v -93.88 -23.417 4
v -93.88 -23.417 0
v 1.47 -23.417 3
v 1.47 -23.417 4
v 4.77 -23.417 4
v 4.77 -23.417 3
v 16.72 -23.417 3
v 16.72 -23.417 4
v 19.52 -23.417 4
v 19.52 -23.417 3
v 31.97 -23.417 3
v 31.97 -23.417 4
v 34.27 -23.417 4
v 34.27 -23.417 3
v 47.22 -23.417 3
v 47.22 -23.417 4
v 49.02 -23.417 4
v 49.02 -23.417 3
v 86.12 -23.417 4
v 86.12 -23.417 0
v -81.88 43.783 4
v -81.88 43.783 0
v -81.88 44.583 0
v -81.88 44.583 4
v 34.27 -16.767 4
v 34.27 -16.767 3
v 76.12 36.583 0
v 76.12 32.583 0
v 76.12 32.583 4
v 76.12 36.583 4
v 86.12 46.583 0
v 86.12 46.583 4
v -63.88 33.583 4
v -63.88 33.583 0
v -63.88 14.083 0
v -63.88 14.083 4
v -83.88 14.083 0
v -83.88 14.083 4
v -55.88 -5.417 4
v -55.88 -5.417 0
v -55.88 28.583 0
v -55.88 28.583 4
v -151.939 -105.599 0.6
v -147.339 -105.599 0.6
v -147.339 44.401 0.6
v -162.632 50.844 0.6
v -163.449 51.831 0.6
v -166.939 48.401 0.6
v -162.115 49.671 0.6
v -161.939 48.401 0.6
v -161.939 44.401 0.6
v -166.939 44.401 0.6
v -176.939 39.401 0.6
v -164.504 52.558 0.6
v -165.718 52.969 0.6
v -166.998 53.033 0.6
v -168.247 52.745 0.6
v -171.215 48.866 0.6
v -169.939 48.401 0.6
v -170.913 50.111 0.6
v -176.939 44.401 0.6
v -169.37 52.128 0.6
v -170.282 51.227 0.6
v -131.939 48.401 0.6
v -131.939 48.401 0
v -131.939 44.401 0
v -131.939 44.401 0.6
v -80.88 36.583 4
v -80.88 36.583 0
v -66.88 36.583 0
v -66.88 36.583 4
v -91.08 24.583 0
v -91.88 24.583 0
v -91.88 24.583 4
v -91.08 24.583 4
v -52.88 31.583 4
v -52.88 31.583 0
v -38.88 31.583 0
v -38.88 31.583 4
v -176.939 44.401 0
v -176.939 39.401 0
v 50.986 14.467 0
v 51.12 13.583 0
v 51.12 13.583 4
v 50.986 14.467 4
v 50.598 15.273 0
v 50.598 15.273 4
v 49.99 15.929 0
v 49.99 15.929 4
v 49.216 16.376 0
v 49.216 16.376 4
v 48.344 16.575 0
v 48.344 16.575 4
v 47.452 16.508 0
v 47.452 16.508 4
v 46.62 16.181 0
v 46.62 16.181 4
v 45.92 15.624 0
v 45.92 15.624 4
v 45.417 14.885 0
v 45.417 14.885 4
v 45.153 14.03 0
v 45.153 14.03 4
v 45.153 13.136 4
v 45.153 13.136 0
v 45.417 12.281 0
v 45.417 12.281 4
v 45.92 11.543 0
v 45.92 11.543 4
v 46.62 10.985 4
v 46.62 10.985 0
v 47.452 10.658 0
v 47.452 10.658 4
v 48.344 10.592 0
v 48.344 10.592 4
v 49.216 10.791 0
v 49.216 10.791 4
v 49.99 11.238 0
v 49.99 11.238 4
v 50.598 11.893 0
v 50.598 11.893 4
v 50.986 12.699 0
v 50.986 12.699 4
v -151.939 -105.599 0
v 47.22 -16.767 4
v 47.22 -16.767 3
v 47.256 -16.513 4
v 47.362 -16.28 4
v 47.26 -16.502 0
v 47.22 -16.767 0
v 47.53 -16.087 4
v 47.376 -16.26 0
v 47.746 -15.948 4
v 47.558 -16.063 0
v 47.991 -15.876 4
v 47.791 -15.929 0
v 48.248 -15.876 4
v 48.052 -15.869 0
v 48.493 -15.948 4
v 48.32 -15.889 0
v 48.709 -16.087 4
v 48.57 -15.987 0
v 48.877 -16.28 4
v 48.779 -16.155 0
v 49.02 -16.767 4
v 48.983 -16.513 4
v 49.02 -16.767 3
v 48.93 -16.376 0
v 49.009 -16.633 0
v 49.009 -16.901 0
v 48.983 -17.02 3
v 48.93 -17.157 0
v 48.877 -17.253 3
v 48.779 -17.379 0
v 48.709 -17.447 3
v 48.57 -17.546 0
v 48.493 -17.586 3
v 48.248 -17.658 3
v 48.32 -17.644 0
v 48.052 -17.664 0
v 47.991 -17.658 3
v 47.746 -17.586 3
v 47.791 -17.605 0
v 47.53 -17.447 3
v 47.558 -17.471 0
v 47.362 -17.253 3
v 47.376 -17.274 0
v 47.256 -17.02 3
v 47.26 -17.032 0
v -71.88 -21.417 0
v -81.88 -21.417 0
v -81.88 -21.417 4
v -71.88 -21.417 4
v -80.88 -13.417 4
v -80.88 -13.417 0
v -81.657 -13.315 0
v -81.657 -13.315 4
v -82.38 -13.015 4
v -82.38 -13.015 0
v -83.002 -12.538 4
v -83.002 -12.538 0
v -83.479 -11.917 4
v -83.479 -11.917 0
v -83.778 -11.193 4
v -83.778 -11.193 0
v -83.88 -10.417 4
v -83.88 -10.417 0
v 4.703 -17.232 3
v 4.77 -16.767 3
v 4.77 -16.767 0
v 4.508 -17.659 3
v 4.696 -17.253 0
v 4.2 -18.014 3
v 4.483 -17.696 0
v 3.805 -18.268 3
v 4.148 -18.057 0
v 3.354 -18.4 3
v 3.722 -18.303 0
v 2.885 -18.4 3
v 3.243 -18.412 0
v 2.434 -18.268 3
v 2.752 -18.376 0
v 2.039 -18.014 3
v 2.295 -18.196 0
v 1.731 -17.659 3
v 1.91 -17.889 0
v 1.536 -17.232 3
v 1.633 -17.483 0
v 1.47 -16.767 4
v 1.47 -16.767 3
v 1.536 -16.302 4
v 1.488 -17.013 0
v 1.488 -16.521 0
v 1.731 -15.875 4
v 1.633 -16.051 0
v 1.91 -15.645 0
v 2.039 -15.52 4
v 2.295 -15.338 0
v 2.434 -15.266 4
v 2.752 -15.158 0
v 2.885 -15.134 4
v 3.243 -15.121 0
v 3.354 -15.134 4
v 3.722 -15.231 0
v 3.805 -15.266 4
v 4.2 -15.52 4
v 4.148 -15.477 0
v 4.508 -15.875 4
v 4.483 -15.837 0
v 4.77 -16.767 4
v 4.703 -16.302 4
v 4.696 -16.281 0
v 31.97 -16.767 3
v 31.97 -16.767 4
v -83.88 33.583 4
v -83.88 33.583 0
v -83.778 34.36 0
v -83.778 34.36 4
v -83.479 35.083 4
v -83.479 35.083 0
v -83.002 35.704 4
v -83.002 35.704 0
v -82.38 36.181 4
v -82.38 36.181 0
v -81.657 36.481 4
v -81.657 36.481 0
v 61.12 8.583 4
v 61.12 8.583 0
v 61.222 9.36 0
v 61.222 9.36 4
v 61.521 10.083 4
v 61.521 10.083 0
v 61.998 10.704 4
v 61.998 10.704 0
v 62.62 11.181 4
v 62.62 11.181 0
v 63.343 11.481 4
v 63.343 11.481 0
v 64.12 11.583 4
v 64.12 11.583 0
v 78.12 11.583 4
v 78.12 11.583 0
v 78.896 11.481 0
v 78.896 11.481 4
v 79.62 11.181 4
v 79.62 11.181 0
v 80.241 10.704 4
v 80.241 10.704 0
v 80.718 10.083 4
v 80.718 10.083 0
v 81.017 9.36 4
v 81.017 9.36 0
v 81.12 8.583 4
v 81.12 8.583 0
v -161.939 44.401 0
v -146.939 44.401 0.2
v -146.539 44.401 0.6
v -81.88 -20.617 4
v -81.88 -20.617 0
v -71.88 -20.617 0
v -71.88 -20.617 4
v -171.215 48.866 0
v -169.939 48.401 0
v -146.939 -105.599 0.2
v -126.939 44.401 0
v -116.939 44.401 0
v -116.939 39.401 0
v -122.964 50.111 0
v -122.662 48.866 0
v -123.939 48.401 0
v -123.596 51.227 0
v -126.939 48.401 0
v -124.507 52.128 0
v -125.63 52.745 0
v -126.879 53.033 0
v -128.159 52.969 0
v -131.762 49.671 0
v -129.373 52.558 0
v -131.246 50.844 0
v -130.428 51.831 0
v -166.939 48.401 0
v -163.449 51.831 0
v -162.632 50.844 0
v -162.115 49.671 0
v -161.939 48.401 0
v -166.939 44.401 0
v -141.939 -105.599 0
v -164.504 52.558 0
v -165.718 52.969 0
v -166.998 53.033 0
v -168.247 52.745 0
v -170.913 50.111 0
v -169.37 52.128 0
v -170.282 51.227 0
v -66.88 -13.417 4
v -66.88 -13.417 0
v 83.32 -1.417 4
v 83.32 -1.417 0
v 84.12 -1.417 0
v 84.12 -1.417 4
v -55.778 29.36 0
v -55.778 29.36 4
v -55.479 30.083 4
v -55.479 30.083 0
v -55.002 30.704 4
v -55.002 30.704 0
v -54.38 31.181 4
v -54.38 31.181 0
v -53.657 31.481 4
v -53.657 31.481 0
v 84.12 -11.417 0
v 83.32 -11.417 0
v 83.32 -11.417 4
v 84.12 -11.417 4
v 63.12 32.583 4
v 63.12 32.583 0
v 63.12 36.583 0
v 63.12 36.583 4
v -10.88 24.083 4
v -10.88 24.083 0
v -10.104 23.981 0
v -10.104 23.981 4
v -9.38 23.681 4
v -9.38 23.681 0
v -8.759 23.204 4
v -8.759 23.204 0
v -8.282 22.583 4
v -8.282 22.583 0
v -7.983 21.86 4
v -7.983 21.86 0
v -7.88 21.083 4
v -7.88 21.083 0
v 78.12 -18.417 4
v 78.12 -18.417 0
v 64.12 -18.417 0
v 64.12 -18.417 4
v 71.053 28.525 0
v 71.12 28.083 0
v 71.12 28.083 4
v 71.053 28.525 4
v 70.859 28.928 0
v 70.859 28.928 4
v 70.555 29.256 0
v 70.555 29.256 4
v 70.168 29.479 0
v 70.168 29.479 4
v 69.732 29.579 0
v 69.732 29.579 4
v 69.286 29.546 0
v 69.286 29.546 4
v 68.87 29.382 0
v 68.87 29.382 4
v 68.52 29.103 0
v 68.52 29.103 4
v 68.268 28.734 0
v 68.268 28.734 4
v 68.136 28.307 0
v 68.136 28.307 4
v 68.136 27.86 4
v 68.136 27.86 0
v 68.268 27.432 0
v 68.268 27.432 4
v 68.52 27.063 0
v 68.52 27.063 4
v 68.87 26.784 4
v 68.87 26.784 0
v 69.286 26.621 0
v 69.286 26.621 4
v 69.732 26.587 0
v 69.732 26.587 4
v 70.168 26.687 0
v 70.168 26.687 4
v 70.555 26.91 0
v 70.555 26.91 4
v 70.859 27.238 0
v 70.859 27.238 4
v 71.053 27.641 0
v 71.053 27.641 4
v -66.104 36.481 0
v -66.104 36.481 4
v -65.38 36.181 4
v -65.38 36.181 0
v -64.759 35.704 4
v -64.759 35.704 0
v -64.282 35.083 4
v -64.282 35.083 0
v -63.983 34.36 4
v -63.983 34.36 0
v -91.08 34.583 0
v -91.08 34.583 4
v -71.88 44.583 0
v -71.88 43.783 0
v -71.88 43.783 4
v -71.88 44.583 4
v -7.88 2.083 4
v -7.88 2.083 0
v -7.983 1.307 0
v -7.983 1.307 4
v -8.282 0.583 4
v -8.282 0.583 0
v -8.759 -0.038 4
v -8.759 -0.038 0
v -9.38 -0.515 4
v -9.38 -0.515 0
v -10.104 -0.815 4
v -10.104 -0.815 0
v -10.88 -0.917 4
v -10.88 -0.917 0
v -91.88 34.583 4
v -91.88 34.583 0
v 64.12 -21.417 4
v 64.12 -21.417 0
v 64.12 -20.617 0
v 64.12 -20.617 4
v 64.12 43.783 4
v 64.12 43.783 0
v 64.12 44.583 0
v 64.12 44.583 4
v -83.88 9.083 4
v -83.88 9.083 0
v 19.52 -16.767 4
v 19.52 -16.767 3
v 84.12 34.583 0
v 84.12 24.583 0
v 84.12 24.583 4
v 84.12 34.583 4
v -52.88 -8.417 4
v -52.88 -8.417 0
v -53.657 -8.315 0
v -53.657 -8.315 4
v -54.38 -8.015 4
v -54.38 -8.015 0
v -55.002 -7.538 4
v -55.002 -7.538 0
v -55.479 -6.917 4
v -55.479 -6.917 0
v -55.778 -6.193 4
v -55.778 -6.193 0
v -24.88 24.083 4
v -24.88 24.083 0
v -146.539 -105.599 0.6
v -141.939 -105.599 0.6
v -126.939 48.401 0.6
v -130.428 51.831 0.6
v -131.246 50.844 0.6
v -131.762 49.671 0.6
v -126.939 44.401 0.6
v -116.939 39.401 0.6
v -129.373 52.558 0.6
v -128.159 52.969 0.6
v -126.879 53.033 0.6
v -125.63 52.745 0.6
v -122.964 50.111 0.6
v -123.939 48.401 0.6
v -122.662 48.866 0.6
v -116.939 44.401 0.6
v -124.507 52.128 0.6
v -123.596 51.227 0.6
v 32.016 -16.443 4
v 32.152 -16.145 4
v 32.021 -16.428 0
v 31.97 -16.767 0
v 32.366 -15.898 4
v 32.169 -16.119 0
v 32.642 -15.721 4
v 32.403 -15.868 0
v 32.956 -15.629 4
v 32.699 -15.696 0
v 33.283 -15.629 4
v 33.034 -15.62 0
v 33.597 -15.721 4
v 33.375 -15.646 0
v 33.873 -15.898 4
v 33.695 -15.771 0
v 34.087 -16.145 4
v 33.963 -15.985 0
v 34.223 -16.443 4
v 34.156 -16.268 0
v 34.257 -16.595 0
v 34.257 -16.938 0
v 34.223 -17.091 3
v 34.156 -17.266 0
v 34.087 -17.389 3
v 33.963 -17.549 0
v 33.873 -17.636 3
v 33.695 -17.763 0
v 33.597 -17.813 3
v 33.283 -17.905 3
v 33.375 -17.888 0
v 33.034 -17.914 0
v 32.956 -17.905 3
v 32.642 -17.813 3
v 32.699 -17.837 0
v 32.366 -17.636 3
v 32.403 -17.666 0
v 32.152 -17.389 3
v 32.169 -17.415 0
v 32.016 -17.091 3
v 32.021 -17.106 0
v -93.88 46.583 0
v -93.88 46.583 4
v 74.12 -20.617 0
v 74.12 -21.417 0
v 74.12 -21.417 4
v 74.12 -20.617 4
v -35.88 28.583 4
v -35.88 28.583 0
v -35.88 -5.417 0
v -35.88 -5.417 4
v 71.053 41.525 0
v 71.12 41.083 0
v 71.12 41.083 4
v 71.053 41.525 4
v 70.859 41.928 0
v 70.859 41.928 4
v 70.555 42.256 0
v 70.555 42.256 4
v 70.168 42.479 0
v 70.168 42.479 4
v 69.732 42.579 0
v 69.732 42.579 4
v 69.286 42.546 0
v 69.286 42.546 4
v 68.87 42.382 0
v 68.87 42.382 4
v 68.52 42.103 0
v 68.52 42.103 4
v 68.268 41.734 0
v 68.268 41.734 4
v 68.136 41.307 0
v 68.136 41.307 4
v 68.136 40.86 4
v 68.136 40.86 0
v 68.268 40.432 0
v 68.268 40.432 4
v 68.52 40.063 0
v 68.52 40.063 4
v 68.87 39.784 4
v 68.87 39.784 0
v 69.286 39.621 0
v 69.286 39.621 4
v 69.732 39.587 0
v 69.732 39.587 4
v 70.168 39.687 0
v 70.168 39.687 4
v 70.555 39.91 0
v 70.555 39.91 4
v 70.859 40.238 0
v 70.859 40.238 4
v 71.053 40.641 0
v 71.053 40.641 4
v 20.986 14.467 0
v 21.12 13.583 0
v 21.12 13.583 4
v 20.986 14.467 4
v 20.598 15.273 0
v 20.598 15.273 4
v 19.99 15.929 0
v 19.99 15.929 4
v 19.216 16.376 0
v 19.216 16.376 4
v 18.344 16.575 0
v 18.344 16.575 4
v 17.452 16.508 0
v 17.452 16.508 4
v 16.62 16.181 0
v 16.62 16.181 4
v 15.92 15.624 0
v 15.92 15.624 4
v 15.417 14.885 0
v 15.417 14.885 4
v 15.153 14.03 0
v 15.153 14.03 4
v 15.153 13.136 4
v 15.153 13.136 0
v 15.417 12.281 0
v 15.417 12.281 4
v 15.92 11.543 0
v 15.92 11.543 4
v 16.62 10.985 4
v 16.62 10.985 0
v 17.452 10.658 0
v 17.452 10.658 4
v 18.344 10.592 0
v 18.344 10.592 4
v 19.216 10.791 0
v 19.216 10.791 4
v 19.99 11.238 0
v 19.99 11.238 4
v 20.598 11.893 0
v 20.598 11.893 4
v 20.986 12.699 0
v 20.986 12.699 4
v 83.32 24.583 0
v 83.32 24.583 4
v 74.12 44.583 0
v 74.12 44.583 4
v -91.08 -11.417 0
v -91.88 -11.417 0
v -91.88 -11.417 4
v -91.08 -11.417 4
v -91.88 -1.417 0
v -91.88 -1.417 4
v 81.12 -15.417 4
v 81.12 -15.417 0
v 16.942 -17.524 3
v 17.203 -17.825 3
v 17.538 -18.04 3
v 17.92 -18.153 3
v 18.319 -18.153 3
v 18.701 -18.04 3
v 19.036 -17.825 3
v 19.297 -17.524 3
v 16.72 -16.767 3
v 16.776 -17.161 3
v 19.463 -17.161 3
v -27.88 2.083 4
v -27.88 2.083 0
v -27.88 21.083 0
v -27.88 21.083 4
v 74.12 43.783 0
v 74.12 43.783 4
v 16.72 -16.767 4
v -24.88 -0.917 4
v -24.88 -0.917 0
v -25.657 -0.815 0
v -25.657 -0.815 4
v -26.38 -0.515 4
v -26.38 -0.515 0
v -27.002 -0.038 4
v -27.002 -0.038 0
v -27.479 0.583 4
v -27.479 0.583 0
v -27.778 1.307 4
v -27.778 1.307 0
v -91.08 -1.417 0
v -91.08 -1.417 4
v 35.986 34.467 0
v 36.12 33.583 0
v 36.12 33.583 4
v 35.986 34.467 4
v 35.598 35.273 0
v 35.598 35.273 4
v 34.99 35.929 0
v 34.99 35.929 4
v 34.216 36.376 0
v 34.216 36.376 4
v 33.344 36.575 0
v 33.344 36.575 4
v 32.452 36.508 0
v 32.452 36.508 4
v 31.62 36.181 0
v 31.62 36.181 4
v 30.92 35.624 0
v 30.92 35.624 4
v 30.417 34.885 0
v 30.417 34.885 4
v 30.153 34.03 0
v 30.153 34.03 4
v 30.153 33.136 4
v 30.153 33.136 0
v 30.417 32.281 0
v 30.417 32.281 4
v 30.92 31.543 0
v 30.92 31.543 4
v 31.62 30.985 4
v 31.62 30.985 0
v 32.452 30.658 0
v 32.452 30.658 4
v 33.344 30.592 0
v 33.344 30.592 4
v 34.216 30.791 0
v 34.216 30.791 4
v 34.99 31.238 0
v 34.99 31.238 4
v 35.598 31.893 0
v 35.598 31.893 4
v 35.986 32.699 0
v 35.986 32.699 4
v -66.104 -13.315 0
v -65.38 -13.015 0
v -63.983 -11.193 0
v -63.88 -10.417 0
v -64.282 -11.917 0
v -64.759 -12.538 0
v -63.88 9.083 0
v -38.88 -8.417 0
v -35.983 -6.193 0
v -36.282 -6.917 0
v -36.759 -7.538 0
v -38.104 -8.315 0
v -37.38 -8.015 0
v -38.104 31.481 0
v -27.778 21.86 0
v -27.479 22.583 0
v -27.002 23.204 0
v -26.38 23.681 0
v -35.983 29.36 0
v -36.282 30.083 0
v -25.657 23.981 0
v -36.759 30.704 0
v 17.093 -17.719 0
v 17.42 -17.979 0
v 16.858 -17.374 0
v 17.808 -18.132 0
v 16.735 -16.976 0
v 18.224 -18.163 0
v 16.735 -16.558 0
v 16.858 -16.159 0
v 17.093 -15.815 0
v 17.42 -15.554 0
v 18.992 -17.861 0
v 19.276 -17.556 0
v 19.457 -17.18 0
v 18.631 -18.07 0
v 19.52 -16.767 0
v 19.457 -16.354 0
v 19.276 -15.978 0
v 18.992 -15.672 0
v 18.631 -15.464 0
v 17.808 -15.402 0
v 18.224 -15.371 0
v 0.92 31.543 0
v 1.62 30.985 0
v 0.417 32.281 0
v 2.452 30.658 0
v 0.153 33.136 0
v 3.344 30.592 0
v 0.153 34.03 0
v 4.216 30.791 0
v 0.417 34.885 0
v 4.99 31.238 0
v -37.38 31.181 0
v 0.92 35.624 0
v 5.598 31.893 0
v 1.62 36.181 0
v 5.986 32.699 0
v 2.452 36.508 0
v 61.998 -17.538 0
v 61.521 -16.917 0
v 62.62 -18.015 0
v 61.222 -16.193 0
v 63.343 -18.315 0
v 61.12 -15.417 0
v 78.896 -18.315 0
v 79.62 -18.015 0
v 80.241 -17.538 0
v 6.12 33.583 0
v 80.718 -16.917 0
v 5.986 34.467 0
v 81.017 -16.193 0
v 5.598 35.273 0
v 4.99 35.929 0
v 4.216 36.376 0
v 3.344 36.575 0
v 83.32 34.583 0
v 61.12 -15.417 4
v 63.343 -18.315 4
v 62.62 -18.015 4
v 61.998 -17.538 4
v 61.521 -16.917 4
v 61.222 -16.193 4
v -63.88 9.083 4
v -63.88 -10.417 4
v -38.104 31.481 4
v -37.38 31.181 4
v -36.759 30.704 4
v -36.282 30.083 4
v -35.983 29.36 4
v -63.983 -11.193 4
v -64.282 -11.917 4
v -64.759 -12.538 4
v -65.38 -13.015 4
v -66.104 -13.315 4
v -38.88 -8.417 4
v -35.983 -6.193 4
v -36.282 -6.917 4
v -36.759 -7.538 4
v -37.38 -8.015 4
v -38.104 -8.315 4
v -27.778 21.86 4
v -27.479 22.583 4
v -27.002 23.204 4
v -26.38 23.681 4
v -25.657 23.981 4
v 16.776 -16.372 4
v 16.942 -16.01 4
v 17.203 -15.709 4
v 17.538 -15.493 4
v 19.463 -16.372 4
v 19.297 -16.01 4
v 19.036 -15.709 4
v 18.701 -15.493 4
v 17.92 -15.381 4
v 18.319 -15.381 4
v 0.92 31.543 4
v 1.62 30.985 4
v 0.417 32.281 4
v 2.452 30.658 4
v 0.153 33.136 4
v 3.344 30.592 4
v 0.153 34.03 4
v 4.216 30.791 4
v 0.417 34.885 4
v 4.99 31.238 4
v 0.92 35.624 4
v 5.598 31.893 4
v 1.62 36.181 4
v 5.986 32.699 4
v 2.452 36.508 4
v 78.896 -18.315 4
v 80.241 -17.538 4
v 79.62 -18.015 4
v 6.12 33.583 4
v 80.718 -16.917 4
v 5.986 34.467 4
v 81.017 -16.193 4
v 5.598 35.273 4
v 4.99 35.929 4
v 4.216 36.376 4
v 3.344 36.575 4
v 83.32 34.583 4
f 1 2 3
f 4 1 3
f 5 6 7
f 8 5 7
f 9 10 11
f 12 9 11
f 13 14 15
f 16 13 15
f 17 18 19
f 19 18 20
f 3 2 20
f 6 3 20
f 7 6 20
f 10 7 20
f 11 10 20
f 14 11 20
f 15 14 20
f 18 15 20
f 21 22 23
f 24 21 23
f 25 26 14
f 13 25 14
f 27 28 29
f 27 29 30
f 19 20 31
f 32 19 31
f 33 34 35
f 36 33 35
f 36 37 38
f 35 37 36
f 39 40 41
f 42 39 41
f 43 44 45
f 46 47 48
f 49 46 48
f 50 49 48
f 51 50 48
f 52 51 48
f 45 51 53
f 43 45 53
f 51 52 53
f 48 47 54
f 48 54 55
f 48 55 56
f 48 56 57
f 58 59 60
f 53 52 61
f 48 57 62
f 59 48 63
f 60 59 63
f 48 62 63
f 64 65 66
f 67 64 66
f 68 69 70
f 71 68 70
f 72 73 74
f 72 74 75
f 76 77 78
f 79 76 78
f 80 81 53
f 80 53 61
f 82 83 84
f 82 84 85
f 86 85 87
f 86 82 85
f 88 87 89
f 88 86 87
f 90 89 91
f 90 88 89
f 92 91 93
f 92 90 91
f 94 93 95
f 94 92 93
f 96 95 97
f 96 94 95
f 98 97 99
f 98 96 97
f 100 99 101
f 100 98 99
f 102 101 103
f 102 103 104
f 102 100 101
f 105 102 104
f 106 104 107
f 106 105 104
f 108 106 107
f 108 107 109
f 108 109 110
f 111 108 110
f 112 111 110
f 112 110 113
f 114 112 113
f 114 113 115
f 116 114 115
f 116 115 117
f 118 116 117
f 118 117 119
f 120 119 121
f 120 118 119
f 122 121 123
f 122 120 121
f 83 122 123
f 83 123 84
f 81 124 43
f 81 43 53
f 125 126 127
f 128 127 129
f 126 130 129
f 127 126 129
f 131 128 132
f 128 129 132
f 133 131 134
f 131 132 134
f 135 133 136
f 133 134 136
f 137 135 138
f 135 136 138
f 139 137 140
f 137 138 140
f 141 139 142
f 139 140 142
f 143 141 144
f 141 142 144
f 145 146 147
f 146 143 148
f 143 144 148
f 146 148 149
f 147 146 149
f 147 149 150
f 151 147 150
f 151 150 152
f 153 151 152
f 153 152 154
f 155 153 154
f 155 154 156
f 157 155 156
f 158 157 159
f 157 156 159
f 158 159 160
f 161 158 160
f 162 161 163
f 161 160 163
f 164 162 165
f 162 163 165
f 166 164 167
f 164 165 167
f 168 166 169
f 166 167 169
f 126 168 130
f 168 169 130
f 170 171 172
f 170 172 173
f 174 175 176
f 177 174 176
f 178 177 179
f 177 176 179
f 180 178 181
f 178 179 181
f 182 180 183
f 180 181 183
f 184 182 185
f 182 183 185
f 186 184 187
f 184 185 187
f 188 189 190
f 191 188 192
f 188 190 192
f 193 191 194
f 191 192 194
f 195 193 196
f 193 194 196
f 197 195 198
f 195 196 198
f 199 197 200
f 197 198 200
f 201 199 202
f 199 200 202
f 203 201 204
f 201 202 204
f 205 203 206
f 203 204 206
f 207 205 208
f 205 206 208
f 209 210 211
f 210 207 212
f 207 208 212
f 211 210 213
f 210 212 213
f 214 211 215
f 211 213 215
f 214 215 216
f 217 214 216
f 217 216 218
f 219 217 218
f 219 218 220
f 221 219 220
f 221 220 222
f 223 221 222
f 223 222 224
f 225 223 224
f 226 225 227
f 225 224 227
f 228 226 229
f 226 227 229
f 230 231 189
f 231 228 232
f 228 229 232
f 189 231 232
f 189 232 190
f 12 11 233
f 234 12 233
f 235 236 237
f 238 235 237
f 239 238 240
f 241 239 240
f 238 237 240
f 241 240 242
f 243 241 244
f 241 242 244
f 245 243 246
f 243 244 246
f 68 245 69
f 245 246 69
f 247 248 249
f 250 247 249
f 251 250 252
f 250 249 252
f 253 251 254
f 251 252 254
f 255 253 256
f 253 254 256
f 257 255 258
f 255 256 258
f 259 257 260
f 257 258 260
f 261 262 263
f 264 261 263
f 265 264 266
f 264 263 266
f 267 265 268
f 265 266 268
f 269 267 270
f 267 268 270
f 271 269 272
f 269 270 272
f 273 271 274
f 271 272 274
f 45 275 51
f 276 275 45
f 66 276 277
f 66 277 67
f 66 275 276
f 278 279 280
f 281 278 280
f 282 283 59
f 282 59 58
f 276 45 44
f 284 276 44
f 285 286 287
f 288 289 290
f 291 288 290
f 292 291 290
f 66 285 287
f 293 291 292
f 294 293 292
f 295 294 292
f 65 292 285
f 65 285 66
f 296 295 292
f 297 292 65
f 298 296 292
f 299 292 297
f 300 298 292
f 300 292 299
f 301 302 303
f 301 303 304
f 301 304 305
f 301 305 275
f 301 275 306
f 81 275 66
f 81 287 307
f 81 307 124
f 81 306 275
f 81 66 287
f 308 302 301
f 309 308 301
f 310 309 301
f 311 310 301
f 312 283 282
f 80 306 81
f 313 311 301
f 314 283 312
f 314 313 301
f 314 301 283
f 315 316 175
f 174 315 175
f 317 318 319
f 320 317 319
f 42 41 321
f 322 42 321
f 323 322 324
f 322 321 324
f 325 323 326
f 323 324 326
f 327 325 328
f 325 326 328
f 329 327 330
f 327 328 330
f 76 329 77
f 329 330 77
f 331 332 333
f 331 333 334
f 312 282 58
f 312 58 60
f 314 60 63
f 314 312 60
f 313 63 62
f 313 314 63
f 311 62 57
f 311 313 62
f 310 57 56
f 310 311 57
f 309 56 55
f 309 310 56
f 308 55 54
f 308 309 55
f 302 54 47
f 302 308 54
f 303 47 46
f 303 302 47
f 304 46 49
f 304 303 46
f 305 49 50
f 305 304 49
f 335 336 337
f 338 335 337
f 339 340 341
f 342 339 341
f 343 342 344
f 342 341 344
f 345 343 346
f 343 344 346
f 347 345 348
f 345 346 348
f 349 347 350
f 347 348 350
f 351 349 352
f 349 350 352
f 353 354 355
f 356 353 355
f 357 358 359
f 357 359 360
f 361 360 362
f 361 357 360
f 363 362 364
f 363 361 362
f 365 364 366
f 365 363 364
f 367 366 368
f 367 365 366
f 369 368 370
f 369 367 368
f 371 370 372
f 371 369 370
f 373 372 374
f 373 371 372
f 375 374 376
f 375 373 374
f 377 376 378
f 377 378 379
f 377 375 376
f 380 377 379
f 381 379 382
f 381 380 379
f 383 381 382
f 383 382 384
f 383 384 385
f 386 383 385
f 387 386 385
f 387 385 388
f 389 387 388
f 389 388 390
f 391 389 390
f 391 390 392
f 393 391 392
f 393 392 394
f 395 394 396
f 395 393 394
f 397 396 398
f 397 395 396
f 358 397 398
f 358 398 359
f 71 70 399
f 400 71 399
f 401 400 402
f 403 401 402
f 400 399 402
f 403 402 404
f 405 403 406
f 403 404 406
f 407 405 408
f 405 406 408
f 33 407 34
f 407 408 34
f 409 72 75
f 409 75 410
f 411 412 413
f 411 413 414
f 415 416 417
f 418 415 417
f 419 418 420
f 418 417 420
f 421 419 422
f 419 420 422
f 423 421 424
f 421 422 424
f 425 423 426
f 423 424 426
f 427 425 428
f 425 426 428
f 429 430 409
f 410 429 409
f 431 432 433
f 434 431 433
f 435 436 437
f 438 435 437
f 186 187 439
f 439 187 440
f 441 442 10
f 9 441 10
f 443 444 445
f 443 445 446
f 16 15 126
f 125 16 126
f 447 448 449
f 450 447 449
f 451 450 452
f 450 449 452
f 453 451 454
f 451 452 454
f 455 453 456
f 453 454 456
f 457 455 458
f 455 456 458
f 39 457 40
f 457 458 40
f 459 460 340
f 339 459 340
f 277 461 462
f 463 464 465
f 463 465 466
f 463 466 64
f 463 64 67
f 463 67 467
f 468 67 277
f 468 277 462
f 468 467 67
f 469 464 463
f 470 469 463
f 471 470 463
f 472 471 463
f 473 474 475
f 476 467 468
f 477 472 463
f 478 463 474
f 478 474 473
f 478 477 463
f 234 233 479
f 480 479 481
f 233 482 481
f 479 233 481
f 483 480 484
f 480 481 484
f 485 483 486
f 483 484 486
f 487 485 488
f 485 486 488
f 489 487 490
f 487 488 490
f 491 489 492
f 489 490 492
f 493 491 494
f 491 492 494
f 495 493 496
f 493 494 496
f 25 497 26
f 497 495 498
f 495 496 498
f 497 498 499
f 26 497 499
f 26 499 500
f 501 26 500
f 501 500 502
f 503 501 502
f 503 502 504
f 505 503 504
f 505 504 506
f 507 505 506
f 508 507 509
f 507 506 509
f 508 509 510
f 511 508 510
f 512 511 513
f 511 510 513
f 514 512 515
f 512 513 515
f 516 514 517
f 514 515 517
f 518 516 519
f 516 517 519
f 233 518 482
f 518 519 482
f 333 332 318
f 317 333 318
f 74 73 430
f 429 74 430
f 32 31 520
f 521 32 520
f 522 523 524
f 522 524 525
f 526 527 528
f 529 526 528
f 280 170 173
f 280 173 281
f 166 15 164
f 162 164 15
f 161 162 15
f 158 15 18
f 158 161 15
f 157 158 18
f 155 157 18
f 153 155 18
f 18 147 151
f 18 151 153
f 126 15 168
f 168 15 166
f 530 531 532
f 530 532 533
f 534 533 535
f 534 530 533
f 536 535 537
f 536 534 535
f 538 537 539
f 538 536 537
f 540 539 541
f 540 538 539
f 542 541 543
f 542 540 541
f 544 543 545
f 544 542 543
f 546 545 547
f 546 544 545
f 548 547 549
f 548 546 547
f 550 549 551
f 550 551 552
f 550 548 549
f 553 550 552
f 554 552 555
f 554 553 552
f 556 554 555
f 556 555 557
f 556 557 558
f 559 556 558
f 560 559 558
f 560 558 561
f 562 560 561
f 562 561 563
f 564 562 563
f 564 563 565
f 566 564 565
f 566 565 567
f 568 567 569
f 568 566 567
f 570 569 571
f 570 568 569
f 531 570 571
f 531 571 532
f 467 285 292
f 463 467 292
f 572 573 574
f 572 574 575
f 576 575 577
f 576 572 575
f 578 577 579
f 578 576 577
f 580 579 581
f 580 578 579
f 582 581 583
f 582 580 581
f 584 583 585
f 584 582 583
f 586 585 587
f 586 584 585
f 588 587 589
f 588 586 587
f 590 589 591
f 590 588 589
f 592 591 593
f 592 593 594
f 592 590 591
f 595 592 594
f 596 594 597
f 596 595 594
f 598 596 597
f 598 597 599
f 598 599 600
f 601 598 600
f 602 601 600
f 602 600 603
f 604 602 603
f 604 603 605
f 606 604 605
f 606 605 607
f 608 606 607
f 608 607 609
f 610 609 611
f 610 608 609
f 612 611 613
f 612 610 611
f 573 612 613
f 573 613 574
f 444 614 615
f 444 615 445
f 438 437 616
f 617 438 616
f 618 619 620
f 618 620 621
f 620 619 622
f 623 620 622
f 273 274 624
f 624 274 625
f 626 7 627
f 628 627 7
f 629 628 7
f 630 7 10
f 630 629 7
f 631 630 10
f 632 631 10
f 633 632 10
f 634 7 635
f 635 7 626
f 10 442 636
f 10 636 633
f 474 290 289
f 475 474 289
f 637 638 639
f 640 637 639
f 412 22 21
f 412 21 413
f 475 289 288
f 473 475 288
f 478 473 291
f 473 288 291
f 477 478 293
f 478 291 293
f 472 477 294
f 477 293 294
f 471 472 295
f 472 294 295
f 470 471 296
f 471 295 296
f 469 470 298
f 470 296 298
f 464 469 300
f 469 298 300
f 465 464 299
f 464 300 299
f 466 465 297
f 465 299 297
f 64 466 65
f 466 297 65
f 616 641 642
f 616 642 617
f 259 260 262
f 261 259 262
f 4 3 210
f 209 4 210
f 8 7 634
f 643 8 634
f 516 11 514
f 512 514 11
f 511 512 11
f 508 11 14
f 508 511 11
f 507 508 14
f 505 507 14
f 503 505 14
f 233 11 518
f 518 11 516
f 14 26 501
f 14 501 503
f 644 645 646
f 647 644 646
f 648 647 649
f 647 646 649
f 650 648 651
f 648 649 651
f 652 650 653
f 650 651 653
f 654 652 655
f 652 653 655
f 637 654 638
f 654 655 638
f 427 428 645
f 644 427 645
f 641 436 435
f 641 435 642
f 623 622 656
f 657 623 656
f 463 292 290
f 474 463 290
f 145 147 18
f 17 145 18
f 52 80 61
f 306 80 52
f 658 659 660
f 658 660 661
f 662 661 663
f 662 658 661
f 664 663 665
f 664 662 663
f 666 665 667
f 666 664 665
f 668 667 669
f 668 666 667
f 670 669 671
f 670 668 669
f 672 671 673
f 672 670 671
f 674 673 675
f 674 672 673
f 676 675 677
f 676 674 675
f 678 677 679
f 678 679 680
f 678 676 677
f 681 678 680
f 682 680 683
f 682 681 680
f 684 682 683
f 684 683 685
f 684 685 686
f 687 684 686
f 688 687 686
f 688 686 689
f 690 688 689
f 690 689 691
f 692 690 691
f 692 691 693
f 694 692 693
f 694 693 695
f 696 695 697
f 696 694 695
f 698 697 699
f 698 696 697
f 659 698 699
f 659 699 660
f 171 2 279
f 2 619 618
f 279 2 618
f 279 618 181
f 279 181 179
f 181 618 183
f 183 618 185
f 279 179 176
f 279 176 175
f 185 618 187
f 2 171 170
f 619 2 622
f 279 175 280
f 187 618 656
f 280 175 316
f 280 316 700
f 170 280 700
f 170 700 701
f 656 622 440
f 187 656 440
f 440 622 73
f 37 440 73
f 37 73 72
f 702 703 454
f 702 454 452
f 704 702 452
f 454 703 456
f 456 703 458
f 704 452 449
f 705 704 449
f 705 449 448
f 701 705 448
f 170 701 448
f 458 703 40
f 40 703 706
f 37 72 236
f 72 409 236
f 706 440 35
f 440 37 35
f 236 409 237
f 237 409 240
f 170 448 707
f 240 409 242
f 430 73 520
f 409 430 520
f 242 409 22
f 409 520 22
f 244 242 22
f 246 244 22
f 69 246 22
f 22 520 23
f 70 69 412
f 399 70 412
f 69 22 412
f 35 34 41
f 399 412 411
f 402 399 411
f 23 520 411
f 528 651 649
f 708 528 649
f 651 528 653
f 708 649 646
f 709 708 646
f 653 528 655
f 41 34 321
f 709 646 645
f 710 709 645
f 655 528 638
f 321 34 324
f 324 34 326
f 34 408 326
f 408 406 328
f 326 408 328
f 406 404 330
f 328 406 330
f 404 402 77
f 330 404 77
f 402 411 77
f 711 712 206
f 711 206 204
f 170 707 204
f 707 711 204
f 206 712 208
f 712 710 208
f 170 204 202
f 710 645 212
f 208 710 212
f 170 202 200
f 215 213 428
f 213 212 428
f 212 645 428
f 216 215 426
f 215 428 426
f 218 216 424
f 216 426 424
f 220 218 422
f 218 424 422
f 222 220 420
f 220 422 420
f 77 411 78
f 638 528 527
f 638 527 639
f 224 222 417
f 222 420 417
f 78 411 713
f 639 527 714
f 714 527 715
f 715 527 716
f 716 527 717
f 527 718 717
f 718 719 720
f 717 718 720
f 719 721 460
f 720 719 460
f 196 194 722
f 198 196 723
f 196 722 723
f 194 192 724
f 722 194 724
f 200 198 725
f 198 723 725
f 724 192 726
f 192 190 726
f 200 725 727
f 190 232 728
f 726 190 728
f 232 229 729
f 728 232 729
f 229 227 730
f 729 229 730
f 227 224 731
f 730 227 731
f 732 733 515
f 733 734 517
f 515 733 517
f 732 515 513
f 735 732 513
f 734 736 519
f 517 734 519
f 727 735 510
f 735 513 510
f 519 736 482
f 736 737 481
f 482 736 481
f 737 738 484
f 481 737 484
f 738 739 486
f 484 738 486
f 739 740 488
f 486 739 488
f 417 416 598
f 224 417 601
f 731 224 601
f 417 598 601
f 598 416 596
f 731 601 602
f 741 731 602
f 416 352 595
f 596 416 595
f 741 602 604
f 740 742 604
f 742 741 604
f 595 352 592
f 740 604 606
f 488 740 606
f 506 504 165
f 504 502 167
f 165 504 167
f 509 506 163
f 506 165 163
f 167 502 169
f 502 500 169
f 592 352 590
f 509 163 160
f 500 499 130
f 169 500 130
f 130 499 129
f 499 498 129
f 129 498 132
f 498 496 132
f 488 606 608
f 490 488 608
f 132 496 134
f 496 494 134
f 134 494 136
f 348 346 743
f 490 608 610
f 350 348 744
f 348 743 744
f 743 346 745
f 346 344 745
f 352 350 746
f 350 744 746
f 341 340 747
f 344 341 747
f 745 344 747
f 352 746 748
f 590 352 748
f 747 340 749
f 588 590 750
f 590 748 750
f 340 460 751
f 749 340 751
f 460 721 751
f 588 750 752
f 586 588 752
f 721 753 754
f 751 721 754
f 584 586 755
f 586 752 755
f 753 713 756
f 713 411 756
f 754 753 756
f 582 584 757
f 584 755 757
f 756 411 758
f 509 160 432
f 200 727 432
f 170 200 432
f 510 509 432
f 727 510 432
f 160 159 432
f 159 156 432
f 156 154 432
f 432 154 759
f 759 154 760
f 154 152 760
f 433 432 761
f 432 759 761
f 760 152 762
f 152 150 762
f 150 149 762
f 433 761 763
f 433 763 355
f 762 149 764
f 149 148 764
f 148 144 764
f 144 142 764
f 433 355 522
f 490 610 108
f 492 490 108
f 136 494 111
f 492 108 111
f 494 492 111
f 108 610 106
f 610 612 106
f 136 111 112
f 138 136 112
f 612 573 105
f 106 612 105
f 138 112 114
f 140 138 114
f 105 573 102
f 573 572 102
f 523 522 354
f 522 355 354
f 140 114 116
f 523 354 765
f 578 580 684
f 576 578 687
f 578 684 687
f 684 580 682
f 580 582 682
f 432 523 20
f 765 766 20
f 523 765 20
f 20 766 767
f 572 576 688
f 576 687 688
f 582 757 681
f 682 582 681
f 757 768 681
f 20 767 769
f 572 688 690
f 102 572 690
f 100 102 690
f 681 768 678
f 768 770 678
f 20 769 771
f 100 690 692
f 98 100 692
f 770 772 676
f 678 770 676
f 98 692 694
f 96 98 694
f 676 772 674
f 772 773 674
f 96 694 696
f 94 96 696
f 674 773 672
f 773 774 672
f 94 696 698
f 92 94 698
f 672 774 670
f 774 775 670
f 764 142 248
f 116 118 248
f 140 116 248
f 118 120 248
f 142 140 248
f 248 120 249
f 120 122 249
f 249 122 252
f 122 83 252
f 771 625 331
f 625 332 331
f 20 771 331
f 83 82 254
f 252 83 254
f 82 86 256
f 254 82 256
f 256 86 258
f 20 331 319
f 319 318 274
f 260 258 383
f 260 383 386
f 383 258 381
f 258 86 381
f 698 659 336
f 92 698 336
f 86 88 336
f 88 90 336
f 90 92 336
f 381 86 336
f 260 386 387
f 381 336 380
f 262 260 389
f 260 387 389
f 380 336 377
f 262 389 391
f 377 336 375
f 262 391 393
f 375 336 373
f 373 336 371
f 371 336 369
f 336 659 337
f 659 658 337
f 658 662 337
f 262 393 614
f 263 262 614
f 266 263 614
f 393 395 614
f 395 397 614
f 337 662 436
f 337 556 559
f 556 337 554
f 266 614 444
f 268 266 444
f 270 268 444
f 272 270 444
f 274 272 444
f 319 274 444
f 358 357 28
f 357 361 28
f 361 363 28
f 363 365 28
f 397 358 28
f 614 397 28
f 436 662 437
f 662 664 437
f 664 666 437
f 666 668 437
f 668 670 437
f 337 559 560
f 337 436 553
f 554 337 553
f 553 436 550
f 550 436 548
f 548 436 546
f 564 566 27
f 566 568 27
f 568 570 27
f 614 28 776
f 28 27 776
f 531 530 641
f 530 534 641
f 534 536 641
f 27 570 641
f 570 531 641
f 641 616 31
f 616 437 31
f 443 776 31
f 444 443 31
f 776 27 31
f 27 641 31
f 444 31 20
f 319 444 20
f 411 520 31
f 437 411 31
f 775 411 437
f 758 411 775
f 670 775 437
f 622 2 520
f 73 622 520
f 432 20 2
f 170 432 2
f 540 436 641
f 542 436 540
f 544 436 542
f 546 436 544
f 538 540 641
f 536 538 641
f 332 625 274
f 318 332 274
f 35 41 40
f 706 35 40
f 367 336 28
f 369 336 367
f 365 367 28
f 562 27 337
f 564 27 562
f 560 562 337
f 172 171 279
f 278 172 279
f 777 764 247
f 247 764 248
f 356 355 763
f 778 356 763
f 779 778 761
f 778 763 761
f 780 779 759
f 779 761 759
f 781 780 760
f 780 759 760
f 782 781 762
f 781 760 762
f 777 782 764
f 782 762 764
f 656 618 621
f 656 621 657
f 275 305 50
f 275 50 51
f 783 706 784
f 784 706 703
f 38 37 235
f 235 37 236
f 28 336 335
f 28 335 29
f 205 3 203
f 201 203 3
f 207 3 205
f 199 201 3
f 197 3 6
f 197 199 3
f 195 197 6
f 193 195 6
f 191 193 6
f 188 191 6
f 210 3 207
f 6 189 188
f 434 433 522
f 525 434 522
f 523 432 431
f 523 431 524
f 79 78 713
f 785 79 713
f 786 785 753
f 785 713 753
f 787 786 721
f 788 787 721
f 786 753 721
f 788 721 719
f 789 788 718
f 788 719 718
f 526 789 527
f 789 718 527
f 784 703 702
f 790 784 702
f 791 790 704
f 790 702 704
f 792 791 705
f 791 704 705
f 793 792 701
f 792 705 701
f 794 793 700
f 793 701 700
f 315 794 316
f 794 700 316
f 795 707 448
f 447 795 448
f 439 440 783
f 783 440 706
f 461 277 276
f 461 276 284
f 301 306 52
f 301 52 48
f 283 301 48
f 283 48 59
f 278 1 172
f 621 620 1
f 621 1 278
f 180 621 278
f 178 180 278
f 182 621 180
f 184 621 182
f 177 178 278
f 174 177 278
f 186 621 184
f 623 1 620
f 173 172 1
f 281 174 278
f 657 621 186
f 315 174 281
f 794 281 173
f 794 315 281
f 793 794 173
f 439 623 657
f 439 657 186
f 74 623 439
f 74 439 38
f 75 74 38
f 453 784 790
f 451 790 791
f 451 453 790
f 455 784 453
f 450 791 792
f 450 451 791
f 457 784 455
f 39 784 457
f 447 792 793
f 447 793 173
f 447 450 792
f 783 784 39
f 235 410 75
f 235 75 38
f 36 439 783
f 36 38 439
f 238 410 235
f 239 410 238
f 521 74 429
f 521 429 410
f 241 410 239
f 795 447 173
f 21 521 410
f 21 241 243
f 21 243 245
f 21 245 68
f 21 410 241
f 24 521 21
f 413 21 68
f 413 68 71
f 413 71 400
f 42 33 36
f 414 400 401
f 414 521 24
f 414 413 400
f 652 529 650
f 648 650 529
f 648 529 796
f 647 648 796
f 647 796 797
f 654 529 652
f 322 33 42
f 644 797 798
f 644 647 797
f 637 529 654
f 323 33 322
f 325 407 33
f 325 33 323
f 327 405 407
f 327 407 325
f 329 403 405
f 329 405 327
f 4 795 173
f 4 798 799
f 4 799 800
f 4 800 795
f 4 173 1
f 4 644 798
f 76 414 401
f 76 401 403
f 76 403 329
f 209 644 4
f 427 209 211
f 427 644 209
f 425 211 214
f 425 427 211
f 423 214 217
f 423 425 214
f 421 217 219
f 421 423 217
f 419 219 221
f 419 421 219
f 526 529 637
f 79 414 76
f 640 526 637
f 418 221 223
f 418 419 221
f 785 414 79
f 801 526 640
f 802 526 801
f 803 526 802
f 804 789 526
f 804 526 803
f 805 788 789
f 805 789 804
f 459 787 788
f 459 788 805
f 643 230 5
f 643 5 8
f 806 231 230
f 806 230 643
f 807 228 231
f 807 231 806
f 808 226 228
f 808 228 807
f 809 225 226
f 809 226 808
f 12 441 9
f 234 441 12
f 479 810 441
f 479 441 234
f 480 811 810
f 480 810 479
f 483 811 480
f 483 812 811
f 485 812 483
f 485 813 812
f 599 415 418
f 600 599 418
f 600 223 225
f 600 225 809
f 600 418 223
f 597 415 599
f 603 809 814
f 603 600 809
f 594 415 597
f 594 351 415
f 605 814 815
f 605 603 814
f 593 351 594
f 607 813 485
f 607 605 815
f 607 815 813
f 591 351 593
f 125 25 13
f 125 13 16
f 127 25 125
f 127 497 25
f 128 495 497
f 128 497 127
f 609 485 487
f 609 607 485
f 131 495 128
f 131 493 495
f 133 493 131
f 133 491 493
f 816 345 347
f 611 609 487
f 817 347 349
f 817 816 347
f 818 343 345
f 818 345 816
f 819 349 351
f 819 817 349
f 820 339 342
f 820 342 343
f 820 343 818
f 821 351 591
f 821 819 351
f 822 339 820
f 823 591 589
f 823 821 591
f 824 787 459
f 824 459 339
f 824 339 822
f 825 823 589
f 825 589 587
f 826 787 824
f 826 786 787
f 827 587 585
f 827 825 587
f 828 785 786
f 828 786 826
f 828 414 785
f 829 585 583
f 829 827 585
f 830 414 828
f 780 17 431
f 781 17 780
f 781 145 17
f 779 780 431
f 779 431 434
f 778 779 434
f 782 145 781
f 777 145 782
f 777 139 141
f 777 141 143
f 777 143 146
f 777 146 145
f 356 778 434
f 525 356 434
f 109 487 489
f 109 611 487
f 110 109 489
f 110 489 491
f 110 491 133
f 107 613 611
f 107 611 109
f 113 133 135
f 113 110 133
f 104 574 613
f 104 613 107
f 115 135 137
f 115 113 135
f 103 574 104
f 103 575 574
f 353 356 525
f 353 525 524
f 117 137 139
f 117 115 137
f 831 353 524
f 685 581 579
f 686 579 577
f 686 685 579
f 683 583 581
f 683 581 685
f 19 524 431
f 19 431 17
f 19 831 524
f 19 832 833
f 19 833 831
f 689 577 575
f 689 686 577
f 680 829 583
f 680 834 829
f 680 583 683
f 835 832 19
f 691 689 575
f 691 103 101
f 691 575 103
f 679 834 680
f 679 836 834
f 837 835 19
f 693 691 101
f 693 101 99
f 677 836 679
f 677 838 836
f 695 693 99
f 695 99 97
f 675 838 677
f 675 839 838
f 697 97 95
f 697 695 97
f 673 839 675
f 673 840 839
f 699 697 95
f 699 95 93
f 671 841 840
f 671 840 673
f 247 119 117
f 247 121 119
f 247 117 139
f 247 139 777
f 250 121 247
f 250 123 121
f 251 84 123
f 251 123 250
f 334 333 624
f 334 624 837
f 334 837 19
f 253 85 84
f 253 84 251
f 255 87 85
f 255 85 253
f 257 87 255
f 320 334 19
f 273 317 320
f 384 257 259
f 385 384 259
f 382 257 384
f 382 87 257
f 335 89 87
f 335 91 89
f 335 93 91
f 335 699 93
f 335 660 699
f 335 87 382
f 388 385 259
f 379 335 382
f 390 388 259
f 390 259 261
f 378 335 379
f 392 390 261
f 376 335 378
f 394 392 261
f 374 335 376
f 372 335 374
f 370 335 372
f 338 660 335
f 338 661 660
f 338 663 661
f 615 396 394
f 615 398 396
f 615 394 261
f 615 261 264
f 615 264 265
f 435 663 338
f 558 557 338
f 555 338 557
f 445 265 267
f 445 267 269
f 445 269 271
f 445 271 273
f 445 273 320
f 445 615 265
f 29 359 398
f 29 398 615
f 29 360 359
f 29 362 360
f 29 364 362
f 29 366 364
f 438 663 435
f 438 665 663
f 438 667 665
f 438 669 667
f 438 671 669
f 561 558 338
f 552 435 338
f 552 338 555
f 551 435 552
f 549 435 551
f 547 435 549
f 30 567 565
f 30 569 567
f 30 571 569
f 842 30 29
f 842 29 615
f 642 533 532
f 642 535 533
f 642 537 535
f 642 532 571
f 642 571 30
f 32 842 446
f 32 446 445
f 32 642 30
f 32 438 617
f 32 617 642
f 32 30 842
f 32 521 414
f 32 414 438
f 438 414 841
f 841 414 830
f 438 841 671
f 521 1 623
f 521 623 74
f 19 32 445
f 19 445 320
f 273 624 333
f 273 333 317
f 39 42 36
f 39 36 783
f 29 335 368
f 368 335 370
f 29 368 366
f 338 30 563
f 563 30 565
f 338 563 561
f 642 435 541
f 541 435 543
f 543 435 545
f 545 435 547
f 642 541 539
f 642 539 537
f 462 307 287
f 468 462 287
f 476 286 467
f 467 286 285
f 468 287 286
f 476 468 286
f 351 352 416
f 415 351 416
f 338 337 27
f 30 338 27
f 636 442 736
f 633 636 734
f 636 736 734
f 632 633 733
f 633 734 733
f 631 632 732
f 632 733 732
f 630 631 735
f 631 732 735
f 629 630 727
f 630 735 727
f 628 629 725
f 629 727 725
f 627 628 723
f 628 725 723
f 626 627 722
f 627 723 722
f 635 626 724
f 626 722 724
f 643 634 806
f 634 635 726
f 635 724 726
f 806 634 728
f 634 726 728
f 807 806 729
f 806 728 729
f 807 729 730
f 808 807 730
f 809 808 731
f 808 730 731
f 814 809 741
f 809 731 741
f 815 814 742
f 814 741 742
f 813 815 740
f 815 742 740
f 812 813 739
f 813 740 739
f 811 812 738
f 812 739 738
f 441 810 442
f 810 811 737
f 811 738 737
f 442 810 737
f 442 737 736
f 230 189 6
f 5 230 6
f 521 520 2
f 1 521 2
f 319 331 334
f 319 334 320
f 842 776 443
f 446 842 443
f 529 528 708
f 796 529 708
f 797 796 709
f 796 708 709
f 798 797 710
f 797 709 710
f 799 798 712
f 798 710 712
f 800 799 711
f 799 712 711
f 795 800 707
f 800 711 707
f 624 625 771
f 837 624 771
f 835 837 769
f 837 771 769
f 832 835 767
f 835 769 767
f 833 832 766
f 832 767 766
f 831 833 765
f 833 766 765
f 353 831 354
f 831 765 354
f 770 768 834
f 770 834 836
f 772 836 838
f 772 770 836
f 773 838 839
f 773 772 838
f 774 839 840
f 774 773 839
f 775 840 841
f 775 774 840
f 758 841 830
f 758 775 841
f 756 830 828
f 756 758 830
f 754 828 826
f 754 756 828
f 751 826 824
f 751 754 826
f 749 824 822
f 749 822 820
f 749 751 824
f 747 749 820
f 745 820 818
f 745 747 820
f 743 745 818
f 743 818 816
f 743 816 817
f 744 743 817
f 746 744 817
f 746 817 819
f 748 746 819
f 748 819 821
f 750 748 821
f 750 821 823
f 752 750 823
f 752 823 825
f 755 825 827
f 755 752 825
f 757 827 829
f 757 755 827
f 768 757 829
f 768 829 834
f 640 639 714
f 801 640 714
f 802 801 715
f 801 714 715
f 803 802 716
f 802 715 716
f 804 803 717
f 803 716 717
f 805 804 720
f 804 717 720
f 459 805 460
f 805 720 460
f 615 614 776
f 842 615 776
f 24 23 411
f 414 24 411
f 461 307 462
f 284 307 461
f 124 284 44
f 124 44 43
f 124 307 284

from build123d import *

# Parameters (mm, degrees)
F0_W     = 0.8
F0_H     = 10
F0_W_2   = 10
F0_H_2   = 0.8
F0_R     = 3
F0_R_2   = 1.5
F0_W_3   = 13
F0_H_3   = 4
F0_W_4   = 20
F0_H_4   = 5
F1_DEPTH = 4
F2_DEPTH = 0.6
F3_DEPTH = 0.6
F4_SIZE  = 0.4
F6_DEPTH = 3


with BuildPart() as f1:
    # F0 (on Top) → F1 (new body)
    with BuildSketch(Plane.XY):
        with BuildLine():
            Line((86.1195294857, 46.5831286013), (-93.8804705143, 46.5831286013))
            Line((-93.8804705143, 46.5831286013), (-93.8804705143, -23.4168713987))
            Line((-93.8804705143, -23.4168713987), (1.4695294857, -23.4168713987))
            Line((1.4695294857, -23.4168713987), (1.4695294857, -16.7668713987))
            ThreePointArc((1.4695294857, -16.7668713987), (3.1195294857, -15.1168713987), (4.7695294857, -16.7668713987))
            Line((4.7695294857, -16.7668713987), (4.7695294857, -23.4168713987))
            Line((4.7695294857, -23.4168713987), (16.7195294857, -23.4168713987))
            Line((16.7195294857, -23.4168713987), (16.7195294857, -16.7668713987))
            ThreePointArc((16.7195294857, -16.7668713987), (18.1195294857, -15.3668713987), (19.5195294857, -16.7668713987))
            Line((19.5195294857, -16.7668713987), (19.5195294857, -23.4168713987))
            Line((19.5195294857, -23.4168713987), (31.9695294857, -23.4168713987))
            Line((31.9695294857, -23.4168713987), (31.9695294857, -16.7668713987))
            ThreePointArc((31.9695294857, -16.7668713987), (33.1195294857, -15.6168713987), (34.2695294857, -16.7668713987))
            Line((34.2695294857, -16.7668713987), (34.2695294857, -23.4168713987))
            Line((34.2695294857, -23.4168713987), (47.2195294857, -23.4168713987))
            Line((47.2195294857, -23.4168713987), (47.2195294857, -16.7668713987))
            ThreePointArc((47.2195294857, -16.7668713987), (48.1195294857, -15.8668713987), (49.0195294857, -16.7668713987))
            Line((49.0195294857, -16.7668713987), (49.0195294857, -23.4168713987))
            Line((49.0195294857, -23.4168713987), (86.1195294857, -23.4168713987))
            Line((86.1195294857, -23.4168713987), (86.1195294857, -13.4168713987))
            Line((86.1195294857, -13.4168713987), (86.1195294857, -7.4168713987))
            Line((86.1195294857, -7.4168713987), (86.1195294857, 30.5831286013))
            Line((86.1195294857, 30.5831286013), (86.1195294857, 36.5831286013))
            Line((86.1195294857, 36.5831286013), (86.1195294857, 46.5831286013))
        make_face()
        with Locations((-91.4804705143, -6.4168713987)):
            Rectangle(F0_W, F0_H, mode=Mode.SUBTRACT)
        with Locations((-76.8804705143, -21.0168713987)):
            Rectangle(F0_W_2, F0_H_2, mode=Mode.SUBTRACT)
        with Locations((69.1195294857, -21.0168713987)):
            Rectangle(F0_W_2, F0_H_2, mode=Mode.SUBTRACT)
        with BuildLine():
            ThreePointArc((61.1195294857, 8.5831286013), (61.9982091421, 10.7044489449), (64.1195294857, 11.5831286013))
            Line((64.1195294857, 11.5831286013), (78.1195294857, 11.5831286013))
            ThreePointArc((78.1195294857, 11.5831286013), (80.2408498293, 10.7044489449), (81.1195294857, 8.5831286013))
            Line((81.1195294857, 8.5831286013), (81.1195294857, -15.4168713987))
            ThreePointArc((81.1195294857, -15.4168713987), (80.2408498293, -17.5381917422), (78.1195294857, -18.4168713987))
            Line((78.1195294857, -18.4168713987), (64.1195294857, -18.4168713987))
            ThreePointArc((64.1195294857, -18.4168713987), (61.9982091421, -17.5381917422), (61.1195294857, -15.4168713987))
            Line((61.1195294857, -15.4168713987), (61.1195294857, 8.5831286013))
        make_face(mode=Mode.SUBTRACT)
        with Locations((83.7195294857, -6.4168713987)):
            Rectangle(F0_W, F0_H, mode=Mode.SUBTRACT)
        with Locations((-91.4804705143, 29.5831286013)):
            Rectangle(F0_W, F0_H, mode=Mode.SUBTRACT)
        with BuildLine():
            ThreePointArc((-83.8804705143, 33.5831286013), (-83.0017908579, 35.7044489449), (-80.8804705143, 36.5831286013))
            Line((-80.8804705143, 36.5831286013), (-66.8804705143, 36.5831286013))
            ThreePointArc((-66.8804705143, 36.5831286013), (-64.7591501707, 35.7044489449), (-63.8804705143, 33.5831286013))
            Line((-63.8804705143, 33.5831286013), (-63.8804705143, 14.0831286013))
            Line((-63.8804705143, 14.0831286013), (-63.8804705143, 9.0831286013))
            Line((-63.8804705143, 9.0831286013), (-63.8804705143, -10.4168713987))
            ThreePointArc((-63.8804705143, -10.4168713987), (-64.7591501707, -12.5381917422), (-66.8804705143, -13.4168713987))
            Line((-66.8804705143, -13.4168713987), (-80.8804705143, -13.4168713987))
            ThreePointArc((-80.8804705143, -13.4168713987), (-83.0017908579, -12.5381917422), (-83.8804705143, -10.4168713987))
            Line((-83.8804705143, -10.4168713987), (-83.8804705143, 9.0831286013))
            Line((-83.8804705143, 9.0831286013), (-83.8804705143, 14.0831286013))
            Line((-83.8804705143, 14.0831286013), (-83.8804705143, 33.5831286013))
        make_face(mode=Mode.SUBTRACT)
        with BuildLine():
            ThreePointArc((-55.8804705143, 28.5831286013), (-55.0017908579, 30.7044489449), (-52.8804705143, 31.5831286013))
            Line((-52.8804705143, 31.5831286013), (-38.8804705143, 31.5831286013))
            ThreePointArc((-38.8804705143, 31.5831286013), (-36.7591501707, 30.7044489449), (-35.8804705143, 28.5831286013))
            Line((-35.8804705143, 28.5831286013), (-35.8804705143, -5.4168713987))
            ThreePointArc((-35.8804705143, -5.4168713987), (-36.7591501707, -7.5381917422), (-38.8804705143, -8.4168713987))
            Line((-38.8804705143, -8.4168713987), (-52.8804705143, -8.4168713987))
            ThreePointArc((-52.8804705143, -8.4168713987), (-55.0017908579, -7.5381917422), (-55.8804705143, -5.4168713987))
            Line((-55.8804705143, -5.4168713987), (-55.8804705143, 28.5831286013))
        make_face(mode=Mode.SUBTRACT)
        with Locations((-76.8804705143, 44.1831286013)):
            Rectangle(F0_W_2, F0_H_2, mode=Mode.SUBTRACT)
        with BuildLine():
            ThreePointArc((-27.8804705143, 21.0831286013), (-27.0017908579, 23.2044489449), (-24.8804705143, 24.0831286013))
            Line((-24.8804705143, 24.0831286013), (-10.8804705143, 24.0831286013))
            ThreePointArc((-10.8804705143, 24.0831286013), (-8.7591501707, 23.2044489449), (-7.8804705143, 21.0831286013))
            Line((-7.8804705143, 21.0831286013), (-7.8804705143, 2.0831286013))
            ThreePointArc((-7.8804705143, 2.0831286013), (-8.7591501707, -0.0381917422), (-10.8804705143, -0.9168713987))
            Line((-10.8804705143, -0.9168713987), (-24.8804705143, -0.9168713987))
            ThreePointArc((-24.8804705143, -0.9168713987), (-27.0017908579, -0.0381917422), (-27.8804705143, 2.0831286013))
            Line((-27.8804705143, 2.0831286013), (-27.8804705143, 21.0831286013))
        make_face(mode=Mode.SUBTRACT)
        with Locations((18.1195294857, 13.5831286013)):
            Circle(F0_R, mode=Mode.SUBTRACT)
        with Locations((3.1195294857, 33.5831286013)):
            Circle(F0_R, mode=Mode.SUBTRACT)
        with Locations((33.1195294857, 33.5831286013)):
            Circle(F0_R, mode=Mode.SUBTRACT)
        with Locations((48.1195294857, 13.5831286013)):
            Circle(F0_R, mode=Mode.SUBTRACT)
        with Locations((69.6195294857, 28.0831286013)):
            Circle(F0_R_2, mode=Mode.SUBTRACT)
        with Locations((69.6195294857, 34.5831286013)):
            Rectangle(F0_W_3, F0_H_3, mode=Mode.SUBTRACT)
        with Locations((69.6195294857, 41.0831286013)):
            Circle(F0_R_2, mode=Mode.SUBTRACT)
        with Locations((69.1195294857, 44.1831286013)):
            Rectangle(F0_W_2, F0_H_2, mode=Mode.SUBTRACT)
        with Locations((83.7195294857, 29.5831286013)):
            Rectangle(F0_W, F0_H, mode=Mode.SUBTRACT)
        with Locations((-73.8804705143, 11.5831286013)):
            Rectangle(F0_W_4, F0_H_4)
    extrude(amount=F1_DEPTH)

    # F0 (on Top) → F6 (join)
    with BuildSketch(Plane.XY):
        with BuildLine():
            Line((1.4695294857, -16.7668713987), (1.4695294857, -23.4168713987))
            Line((1.4695294857, -23.4168713987), (4.7695294857, -23.4168713987))
            Line((4.7695294857, -23.4168713987), (4.7695294857, -16.7668713987))
            ThreePointArc((4.7695294857, -16.7668713987), (3.1195294857, -18.4168713987), (1.4695294857, -16.7668713987))
        make_face()
        with BuildLine():
            Line((16.7195294857, -16.7668713987), (16.7195294857, -23.4168713987))
            Line((16.7195294857, -23.4168713987), (19.5195294857, -23.4168713987))
            Line((19.5195294857, -23.4168713987), (19.5195294857, -16.7668713987))
            ThreePointArc((19.5195294857, -16.7668713987), (18.1195294857, -18.1668713987), (16.7195294857, -16.7668713987))
        make_face()
        with BuildLine():
            Line((31.9695294857, -16.7668713987), (31.9695294857, -23.4168713987))
            Line((31.9695294857, -23.4168713987), (34.2695294857, -23.4168713987))
            Line((34.2695294857, -23.4168713987), (34.2695294857, -16.7668713987))
            ThreePointArc((34.2695294857, -16.7668713987), (33.1195294857, -17.9168713987), (31.9695294857, -16.7668713987))
        make_face()
        with BuildLine():
            Line((47.2195294857, -23.4168713987), (49.0195294857, -23.4168713987))
            Line((49.0195294857, -23.4168713987), (49.0195294857, -16.7668713987))
            ThreePointArc((49.0195294857, -16.7668713987), (48.1195294857, -17.6668713987), (47.2195294857, -16.7668713987))
            Line((47.2195294857, -16.7668713987), (47.2195294857, -23.4168713987))
        make_face()
    extrude(amount=F6_DEPTH)


with BuildPart() as f2:
    # F0 (on Top) → F2 (new body)
    with BuildSketch(Plane.XY):
        Polygon((-136.9385750294, 44.4011760906), (-146.9385750294, 44.4011760906), (-146.9385750294, -105.5988239094), (-141.9385750294, -105.5988239094), (-136.9385750294, -76.5988239094), align=None)
    extrude(amount=F2_DEPTH)

    # F0 (on Top) → F3 (join)
    with BuildSketch(Plane.XY):
        Polygon((-131.9385750294, 44.4011760906), (-136.9385750294, 44.4011760906), (-136.9385750294, -76.5988239094), (-116.9385750294, 39.4011760906), (-116.9385750294, 44.4011760906), (-126.9385750294, 44.4011760906), (-126.9385750294, 48.4011760906), (-131.9385750294, 48.4011760906), align=None)
        with BuildLine():
            ThreePointArc((-122.6618522111, 48.8658651938), (-127.5212108982, 53.0453531493), (-131.9385750294, 48.4011760906))
            Line((-131.9385750294, 48.4011760906), (-126.9385750294, 48.4011760906))
            Line((-126.9385750294, 48.4011760906), (-123.9385750294, 48.4011760906))
            Line((-123.9385750294, 48.4011760906), (-122.6618522111, 48.8658651938))
        make_face()
    extrude(amount=F3_DEPTH)

    # F4
    f4_edges = [f2.edges().sort_by_distance(p)[0] for p in [
        (-146.938575, -30.598824, 0.6),
    ]]
    chamfer(f4_edges, length=F4_SIZE)

    # F5: F2 across face


with BuildPart() as f2_1:
    add(f2.part)
    add(f2.part.mirror(Plane(origin=(-146.9385750294, -30.5988239094, 0.1), x_dir=(0, -1, 0), z_dir=(-1, 0, 0))))


solid = Compound([f1.part, f2_1.part])
